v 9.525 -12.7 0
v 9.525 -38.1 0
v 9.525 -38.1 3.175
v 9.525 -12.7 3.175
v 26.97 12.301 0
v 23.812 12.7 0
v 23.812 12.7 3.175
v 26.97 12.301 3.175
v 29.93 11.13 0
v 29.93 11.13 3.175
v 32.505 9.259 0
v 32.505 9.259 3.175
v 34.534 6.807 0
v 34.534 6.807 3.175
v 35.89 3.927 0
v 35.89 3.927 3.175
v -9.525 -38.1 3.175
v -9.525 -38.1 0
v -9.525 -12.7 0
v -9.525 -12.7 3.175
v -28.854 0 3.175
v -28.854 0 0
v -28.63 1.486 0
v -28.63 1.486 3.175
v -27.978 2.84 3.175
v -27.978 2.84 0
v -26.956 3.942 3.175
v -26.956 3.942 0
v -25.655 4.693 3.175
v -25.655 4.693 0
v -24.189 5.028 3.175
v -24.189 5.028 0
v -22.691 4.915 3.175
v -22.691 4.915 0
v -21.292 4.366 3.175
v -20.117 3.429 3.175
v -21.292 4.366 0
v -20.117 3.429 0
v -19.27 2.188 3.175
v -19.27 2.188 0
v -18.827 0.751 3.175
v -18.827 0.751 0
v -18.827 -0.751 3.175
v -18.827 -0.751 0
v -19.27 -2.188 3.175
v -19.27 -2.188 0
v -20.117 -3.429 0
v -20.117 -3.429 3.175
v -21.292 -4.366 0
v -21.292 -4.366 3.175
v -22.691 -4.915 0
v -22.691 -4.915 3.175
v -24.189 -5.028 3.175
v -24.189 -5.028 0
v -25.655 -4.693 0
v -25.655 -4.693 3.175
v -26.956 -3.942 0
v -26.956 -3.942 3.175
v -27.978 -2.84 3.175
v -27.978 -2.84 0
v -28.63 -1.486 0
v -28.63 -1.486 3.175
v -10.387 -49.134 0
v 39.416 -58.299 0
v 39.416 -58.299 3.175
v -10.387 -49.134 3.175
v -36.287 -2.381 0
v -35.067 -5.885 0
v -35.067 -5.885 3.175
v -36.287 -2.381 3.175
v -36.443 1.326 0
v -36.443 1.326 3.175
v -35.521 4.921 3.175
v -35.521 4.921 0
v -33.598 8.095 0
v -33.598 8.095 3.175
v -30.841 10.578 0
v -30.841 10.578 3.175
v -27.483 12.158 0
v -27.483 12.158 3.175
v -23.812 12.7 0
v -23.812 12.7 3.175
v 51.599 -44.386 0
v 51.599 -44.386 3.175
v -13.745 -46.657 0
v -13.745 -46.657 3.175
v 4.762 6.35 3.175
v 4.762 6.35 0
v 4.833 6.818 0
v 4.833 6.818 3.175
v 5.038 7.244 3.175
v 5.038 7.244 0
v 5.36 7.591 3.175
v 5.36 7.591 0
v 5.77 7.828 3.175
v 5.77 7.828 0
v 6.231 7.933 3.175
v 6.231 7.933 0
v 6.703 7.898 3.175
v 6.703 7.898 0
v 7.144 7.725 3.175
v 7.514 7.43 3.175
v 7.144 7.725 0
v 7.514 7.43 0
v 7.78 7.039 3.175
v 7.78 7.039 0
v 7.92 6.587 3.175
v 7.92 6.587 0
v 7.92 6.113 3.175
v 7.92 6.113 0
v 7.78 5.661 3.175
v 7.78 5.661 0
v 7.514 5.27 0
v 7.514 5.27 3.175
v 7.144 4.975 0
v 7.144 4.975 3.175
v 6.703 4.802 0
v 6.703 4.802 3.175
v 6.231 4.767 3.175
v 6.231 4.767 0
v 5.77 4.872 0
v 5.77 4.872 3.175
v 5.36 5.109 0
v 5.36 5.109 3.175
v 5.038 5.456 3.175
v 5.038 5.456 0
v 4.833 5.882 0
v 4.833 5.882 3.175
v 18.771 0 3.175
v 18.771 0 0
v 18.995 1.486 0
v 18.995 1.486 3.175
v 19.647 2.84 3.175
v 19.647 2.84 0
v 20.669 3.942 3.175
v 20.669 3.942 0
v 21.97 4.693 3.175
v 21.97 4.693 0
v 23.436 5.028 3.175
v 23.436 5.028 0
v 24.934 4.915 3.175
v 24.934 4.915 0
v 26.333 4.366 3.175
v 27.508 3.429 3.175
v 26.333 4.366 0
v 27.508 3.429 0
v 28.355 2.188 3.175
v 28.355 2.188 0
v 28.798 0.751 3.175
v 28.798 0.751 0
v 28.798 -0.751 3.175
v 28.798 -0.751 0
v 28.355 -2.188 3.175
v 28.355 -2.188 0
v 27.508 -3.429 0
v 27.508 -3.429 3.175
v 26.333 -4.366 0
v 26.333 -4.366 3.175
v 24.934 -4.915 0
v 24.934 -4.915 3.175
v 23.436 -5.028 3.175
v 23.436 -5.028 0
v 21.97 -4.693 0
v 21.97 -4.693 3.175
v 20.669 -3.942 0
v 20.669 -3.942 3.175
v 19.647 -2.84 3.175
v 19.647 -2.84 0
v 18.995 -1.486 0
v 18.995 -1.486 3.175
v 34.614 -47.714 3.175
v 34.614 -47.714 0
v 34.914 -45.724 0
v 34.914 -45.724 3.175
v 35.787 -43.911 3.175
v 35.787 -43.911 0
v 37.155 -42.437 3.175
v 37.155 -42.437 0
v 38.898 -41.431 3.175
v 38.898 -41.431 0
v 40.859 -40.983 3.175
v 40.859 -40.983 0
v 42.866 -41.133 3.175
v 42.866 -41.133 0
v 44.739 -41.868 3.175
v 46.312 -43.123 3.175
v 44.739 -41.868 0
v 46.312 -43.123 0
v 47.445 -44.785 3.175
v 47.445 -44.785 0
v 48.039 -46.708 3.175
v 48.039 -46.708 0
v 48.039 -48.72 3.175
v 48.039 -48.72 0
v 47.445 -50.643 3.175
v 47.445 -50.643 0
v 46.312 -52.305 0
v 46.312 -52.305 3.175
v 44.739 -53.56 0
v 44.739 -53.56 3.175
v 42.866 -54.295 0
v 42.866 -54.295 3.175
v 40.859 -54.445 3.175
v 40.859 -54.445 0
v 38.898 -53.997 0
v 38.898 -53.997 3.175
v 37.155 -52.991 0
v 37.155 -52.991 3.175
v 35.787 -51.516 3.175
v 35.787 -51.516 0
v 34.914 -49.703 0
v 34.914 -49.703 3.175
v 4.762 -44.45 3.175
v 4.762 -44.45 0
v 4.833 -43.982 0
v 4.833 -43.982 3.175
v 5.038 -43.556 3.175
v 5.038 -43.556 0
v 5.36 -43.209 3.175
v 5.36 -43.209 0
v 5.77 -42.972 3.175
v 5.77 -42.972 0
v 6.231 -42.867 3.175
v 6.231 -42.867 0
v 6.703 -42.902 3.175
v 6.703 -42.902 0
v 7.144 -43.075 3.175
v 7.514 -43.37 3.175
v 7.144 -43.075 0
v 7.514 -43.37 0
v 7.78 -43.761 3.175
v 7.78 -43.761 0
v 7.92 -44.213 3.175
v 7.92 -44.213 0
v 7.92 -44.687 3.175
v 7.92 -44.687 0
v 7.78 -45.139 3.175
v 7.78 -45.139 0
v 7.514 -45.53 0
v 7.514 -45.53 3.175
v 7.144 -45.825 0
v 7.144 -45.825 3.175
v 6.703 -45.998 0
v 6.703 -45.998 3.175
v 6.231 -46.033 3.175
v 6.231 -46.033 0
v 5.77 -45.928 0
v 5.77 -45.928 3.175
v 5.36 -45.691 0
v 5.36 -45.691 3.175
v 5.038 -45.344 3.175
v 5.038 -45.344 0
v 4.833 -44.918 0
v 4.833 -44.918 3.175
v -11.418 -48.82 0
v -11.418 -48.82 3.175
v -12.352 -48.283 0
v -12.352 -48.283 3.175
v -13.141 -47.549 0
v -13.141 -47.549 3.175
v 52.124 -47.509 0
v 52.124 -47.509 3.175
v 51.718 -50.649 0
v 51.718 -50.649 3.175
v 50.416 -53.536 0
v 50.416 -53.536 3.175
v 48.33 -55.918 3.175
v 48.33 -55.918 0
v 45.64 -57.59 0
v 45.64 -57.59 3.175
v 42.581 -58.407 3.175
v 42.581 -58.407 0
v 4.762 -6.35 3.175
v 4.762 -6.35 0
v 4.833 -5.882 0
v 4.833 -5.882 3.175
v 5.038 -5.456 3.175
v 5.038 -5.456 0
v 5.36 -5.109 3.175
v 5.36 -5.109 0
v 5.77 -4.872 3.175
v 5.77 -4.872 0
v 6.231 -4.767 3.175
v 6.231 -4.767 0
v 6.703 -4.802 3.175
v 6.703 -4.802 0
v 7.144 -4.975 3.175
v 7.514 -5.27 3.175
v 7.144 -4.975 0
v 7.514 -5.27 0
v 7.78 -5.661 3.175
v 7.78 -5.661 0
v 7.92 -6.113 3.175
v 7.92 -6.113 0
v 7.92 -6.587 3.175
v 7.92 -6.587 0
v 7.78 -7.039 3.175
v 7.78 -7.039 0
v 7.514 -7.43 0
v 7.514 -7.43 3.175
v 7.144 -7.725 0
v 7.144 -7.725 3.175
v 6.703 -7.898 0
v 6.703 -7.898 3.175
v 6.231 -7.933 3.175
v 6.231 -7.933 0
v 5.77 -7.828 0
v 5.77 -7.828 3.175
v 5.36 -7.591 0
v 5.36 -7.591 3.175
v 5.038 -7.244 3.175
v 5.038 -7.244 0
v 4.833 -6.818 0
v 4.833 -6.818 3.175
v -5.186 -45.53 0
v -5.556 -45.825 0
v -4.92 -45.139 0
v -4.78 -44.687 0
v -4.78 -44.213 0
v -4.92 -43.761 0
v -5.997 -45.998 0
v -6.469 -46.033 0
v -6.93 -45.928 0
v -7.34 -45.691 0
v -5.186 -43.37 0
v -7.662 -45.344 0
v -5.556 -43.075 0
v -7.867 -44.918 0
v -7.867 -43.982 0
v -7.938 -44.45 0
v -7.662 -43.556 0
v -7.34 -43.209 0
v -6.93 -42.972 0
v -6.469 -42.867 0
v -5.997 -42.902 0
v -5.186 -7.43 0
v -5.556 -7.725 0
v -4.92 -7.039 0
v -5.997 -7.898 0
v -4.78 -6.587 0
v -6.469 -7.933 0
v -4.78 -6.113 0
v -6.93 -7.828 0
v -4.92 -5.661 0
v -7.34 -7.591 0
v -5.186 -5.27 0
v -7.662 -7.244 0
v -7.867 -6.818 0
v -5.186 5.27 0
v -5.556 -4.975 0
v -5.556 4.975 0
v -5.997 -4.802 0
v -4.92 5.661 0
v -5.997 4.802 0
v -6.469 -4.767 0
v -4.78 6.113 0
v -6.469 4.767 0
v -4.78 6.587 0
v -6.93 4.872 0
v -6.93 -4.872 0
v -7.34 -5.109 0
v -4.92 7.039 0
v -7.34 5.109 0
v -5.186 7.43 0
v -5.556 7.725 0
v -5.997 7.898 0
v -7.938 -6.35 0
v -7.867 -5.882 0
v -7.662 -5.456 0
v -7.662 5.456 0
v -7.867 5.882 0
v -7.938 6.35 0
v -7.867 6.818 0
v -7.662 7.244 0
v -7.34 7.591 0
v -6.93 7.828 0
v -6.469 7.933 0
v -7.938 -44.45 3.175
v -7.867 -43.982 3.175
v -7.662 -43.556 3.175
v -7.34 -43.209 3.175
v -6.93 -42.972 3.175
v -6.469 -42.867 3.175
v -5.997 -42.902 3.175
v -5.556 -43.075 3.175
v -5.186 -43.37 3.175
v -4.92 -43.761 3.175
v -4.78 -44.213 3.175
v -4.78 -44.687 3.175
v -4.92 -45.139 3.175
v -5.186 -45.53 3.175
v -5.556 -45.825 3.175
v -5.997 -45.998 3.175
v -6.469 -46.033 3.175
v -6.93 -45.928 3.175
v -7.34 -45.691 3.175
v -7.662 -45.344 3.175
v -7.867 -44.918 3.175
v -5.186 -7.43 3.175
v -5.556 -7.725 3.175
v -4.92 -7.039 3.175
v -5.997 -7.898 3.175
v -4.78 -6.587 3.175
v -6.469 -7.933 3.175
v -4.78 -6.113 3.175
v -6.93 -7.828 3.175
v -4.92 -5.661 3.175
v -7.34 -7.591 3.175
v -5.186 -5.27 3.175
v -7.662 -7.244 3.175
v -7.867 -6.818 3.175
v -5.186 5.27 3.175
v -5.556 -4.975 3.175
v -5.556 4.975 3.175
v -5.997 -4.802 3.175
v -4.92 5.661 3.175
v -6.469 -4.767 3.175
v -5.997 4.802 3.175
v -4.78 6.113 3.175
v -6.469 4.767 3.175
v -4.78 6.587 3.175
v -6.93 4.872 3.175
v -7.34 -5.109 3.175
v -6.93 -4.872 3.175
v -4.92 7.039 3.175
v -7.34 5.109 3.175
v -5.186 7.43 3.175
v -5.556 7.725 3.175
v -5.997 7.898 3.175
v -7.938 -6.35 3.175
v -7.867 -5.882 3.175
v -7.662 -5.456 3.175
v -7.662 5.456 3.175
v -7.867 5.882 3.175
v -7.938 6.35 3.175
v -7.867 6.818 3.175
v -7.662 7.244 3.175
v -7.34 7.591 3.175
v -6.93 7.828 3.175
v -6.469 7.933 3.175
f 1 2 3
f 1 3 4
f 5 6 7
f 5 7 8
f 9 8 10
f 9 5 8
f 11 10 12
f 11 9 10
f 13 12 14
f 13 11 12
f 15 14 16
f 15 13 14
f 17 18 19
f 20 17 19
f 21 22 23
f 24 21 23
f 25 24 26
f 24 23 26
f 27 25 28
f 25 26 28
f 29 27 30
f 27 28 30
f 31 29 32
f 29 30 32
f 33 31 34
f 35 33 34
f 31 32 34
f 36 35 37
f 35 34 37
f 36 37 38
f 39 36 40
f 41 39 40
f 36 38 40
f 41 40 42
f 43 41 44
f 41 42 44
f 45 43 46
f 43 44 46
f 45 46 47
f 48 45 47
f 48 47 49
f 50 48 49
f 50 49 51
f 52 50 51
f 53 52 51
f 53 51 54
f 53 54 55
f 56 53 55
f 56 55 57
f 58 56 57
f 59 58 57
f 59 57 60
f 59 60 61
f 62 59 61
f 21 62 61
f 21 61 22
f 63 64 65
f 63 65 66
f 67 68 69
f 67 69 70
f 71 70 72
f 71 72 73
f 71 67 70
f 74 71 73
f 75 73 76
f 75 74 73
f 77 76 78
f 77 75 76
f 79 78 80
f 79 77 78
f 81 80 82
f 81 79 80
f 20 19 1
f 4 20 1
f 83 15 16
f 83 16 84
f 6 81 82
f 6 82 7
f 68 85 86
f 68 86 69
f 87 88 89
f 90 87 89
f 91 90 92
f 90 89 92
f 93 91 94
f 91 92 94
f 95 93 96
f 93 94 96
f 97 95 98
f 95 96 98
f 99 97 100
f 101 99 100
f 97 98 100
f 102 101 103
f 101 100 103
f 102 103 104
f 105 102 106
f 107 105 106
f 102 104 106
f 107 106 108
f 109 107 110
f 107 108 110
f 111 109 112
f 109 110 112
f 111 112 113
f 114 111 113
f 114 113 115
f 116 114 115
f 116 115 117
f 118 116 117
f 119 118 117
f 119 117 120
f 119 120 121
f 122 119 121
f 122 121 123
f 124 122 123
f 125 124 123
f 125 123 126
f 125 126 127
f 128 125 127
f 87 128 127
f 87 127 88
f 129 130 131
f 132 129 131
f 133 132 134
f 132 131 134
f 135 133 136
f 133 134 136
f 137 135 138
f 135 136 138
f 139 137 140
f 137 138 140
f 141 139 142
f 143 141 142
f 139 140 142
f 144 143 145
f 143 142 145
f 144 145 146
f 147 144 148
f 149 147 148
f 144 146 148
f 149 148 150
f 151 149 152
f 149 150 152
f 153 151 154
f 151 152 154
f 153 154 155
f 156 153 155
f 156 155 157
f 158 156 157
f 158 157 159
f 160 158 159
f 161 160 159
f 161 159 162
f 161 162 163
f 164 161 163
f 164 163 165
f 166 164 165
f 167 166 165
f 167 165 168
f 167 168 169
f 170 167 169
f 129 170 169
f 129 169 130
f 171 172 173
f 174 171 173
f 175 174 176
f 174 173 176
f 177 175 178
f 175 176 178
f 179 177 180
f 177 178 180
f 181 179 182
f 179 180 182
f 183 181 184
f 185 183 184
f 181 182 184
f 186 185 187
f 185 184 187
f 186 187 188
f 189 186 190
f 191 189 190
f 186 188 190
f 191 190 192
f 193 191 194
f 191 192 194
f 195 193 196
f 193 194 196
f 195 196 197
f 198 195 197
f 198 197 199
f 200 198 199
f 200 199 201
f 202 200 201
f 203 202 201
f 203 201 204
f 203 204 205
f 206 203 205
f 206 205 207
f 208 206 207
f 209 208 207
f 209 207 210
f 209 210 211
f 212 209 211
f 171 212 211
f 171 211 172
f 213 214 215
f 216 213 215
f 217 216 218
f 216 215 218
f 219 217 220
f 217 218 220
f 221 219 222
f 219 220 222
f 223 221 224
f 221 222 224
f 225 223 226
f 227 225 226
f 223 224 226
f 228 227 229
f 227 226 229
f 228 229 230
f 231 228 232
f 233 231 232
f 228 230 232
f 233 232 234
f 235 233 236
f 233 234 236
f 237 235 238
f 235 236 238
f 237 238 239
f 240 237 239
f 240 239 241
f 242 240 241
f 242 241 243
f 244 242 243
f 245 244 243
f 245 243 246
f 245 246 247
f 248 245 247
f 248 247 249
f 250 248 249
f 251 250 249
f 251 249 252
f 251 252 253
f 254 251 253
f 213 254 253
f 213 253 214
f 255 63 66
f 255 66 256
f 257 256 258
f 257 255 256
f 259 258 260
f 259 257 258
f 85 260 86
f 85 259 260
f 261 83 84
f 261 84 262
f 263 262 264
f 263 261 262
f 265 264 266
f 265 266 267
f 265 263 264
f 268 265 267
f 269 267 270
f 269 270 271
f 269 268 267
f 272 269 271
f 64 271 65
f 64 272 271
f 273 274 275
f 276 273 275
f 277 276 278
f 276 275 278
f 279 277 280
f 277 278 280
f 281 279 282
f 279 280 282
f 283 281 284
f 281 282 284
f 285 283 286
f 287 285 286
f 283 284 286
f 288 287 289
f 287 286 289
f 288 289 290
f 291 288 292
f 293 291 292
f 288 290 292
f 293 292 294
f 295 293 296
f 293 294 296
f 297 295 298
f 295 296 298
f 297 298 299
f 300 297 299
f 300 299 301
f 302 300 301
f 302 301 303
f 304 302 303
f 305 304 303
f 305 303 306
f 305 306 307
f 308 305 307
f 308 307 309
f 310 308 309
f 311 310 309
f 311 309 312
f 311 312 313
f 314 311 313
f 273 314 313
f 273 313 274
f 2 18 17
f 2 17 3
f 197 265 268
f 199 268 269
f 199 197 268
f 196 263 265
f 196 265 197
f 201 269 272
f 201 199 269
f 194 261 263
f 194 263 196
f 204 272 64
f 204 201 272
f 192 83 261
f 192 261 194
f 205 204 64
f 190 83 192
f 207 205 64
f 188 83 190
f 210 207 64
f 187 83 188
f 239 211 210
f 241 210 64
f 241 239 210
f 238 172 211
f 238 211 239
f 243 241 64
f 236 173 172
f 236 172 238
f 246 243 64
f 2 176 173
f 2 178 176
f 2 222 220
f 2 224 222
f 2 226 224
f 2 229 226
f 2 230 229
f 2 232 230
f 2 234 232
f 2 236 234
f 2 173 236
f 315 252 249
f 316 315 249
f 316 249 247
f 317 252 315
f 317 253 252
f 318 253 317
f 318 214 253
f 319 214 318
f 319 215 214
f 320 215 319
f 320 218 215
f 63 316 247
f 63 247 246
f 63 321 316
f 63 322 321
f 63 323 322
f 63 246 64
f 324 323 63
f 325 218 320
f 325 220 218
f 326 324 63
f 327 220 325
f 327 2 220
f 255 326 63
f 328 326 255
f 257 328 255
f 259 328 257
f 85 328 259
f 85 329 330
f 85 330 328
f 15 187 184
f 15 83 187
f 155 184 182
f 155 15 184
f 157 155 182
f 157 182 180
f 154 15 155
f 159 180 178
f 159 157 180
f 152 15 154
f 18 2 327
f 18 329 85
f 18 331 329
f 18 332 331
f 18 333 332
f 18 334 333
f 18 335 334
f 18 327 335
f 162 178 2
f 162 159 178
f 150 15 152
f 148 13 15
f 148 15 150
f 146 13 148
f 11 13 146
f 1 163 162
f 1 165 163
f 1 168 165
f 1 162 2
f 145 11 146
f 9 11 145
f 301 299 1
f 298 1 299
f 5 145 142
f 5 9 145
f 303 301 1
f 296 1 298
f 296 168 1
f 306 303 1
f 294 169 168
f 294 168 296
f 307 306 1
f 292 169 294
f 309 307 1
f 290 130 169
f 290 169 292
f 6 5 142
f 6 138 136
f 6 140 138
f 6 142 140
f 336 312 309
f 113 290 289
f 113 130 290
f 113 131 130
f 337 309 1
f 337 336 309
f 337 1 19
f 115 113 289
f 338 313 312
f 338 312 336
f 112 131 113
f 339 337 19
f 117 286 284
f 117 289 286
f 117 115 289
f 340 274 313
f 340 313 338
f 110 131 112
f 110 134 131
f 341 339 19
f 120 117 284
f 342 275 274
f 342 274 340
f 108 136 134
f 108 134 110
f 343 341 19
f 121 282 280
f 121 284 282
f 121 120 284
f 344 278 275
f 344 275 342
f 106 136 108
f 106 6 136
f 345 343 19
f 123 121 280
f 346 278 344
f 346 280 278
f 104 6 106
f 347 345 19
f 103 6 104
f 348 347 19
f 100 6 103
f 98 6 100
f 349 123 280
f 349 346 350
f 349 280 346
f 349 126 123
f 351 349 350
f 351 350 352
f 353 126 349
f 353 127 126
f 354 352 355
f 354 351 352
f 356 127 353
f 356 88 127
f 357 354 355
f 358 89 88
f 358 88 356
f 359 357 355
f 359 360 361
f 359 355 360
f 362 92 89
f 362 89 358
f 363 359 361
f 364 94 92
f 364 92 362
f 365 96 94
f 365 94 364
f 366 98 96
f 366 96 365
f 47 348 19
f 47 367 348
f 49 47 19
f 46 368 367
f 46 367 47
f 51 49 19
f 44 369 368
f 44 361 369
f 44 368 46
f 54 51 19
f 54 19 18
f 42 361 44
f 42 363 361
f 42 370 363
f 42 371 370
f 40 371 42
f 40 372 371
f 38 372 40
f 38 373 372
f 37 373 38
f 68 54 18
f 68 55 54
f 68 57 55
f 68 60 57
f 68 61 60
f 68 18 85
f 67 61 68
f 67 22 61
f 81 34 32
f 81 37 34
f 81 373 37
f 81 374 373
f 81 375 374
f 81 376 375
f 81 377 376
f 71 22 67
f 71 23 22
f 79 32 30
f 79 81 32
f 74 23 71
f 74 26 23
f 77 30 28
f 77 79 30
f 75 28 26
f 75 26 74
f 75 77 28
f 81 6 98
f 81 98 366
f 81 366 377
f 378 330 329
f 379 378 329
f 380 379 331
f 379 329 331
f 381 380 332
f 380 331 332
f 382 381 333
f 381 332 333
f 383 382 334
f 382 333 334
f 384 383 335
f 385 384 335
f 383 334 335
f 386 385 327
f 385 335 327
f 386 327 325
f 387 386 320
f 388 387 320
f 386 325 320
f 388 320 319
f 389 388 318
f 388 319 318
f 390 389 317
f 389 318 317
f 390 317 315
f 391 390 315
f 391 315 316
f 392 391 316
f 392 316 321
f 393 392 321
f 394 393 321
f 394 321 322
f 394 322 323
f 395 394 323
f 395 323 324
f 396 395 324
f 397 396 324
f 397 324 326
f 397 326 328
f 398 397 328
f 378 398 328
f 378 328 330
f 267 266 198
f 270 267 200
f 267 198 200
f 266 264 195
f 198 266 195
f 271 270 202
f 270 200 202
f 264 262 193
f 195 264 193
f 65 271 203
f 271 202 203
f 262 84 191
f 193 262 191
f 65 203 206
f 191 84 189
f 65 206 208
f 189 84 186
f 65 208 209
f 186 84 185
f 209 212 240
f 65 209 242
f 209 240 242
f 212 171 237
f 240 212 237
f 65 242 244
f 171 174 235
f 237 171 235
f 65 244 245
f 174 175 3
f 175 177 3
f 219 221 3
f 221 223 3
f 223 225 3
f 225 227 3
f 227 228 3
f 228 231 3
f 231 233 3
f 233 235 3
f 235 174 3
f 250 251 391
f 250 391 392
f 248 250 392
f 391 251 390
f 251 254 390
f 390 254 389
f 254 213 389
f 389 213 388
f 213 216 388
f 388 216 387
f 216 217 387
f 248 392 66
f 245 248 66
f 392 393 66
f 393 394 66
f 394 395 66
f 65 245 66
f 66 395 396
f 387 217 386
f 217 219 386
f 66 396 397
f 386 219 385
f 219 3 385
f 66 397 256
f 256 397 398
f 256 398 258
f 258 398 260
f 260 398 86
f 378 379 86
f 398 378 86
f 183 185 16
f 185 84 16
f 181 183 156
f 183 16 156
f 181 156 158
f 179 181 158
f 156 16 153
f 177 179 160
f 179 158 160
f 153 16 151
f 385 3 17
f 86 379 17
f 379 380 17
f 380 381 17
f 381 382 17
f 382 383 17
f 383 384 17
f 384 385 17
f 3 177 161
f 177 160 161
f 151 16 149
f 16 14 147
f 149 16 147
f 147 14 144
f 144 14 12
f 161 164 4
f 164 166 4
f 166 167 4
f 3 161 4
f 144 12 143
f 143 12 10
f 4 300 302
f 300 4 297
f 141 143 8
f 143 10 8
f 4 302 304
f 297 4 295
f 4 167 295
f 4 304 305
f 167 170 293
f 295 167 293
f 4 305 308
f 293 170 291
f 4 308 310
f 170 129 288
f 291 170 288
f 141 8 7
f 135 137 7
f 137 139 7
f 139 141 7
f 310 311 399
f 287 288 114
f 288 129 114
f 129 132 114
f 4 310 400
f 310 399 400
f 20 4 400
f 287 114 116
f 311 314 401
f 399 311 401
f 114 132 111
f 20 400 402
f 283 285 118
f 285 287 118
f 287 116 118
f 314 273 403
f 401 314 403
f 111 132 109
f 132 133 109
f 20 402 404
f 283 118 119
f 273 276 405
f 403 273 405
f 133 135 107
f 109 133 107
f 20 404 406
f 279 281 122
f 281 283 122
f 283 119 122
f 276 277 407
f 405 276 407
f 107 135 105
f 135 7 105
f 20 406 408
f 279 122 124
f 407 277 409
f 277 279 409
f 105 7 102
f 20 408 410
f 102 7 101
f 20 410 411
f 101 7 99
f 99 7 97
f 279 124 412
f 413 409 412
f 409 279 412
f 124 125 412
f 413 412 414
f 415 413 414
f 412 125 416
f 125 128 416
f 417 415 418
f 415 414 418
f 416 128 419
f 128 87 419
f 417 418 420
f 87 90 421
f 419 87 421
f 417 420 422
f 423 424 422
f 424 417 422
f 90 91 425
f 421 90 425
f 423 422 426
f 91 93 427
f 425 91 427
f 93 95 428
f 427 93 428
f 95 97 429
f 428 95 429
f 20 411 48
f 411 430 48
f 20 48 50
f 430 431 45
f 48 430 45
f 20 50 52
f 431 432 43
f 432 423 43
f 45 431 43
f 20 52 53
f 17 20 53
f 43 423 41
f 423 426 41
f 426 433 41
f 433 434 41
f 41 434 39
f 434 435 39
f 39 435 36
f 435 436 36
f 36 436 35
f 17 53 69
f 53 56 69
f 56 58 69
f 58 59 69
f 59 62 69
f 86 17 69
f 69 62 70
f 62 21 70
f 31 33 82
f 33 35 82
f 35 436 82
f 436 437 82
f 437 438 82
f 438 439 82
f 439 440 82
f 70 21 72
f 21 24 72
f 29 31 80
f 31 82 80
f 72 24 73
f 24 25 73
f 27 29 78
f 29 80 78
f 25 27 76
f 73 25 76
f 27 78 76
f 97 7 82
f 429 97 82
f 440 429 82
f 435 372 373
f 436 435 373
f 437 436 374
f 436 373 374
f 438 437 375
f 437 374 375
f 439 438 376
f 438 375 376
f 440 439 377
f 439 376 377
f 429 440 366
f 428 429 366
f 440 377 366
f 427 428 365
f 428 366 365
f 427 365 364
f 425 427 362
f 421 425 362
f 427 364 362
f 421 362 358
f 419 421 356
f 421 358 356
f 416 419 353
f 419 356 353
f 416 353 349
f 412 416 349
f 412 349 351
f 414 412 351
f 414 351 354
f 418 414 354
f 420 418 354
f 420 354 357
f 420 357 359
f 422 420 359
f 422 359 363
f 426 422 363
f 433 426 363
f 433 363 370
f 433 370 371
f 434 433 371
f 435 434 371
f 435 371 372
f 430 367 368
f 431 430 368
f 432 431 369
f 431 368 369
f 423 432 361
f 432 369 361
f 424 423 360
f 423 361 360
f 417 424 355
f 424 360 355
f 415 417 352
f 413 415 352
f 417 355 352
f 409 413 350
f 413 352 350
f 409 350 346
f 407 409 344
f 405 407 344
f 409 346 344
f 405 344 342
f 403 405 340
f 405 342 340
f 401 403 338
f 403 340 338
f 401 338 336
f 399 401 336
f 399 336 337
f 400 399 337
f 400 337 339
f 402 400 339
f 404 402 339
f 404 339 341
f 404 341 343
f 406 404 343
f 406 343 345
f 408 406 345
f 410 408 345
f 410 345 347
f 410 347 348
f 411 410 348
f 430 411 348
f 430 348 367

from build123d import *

# Parameters (mm, degrees)
SKETCH1_W                    = 19.05
SKETCH1_H                    = 25.4
BOSS_EXTRUDE1_DEPTH          = 3.175
F_3_8_CLEARANCE_HOLE1_D      = 10.0838
M12_CLEARANCE_HOLE1_D        = 13.5
F_1_8_0_125_DIAMETER_HOLE1_D = 3.175


with BuildPart() as part:
    # Sketch1 → Boss-Extrude1 (new body)
    with BuildSketch(Plane.XY):
        with BuildLine():
            Line((-23.8125, 12.7), (23.8125, 12.7))
            ThreePointArc((23.8125, 12.7), (31.276314181, 10.275284807), (35.890108891, 3.927004389))
            Line((35.890108891, 3.927004389), (51.598960291, -44.38599569))
            ThreePointArc((51.598960291, -44.38599569), (49.460825767, -54.804118571), (39.416075709, -58.298671456))
            Line((39.416075709, -58.298671456), (-10.386929216, -49.133853571))
            ThreePointArc((-10.386929216, -49.133853571), (-12.351826078, -48.282813663), (-13.745274772, -46.65696332))
            Line((-13.745274772, -46.65696332), (-35.06656606, -5.885235519))
            ThreePointArc((-35.06656606, -5.885235519), (-34.676028227, 6.578278989), (-23.8125, 12.7))
        make_face()
        with Locations((0, -25.4)):
            Rectangle(SKETCH1_W, SKETCH1_H, mode=Mode.SUBTRACT)
    extrude(amount=BOSS_EXTRUDE1_DEPTH)

    # 3/8 Clearance Hole1 (through all)
    with Locations(Plane.XY.offset(3.175)):
        with Locations((-23.8125, 0), (23.8125, 0)):
            Hole(F_3_8_CLEARANCE_HOLE1_D / 2)

    # M12 Clearance Hole1 (through all)
    with Locations(Plane.XY.offset(3.175)):
        with Locations((41.3639, -47.7139)):
            Hole(M12_CLEARANCE_HOLE1_D / 2)

    # 1/8 (0.125) Diameter Hole1 (through all)
    with Locations(Plane.XY.offset(3.175)):
        with Locations((6.35, -6.35), (-6.35, 6.35), (-6.35, -6.35), (6.35, 6.35), (-6.35, -44.45), (6.35, -44.45)):
            Hole(F_1_8_0_125_DIAMETER_HOLE1_D / 2)


solid = part.part
